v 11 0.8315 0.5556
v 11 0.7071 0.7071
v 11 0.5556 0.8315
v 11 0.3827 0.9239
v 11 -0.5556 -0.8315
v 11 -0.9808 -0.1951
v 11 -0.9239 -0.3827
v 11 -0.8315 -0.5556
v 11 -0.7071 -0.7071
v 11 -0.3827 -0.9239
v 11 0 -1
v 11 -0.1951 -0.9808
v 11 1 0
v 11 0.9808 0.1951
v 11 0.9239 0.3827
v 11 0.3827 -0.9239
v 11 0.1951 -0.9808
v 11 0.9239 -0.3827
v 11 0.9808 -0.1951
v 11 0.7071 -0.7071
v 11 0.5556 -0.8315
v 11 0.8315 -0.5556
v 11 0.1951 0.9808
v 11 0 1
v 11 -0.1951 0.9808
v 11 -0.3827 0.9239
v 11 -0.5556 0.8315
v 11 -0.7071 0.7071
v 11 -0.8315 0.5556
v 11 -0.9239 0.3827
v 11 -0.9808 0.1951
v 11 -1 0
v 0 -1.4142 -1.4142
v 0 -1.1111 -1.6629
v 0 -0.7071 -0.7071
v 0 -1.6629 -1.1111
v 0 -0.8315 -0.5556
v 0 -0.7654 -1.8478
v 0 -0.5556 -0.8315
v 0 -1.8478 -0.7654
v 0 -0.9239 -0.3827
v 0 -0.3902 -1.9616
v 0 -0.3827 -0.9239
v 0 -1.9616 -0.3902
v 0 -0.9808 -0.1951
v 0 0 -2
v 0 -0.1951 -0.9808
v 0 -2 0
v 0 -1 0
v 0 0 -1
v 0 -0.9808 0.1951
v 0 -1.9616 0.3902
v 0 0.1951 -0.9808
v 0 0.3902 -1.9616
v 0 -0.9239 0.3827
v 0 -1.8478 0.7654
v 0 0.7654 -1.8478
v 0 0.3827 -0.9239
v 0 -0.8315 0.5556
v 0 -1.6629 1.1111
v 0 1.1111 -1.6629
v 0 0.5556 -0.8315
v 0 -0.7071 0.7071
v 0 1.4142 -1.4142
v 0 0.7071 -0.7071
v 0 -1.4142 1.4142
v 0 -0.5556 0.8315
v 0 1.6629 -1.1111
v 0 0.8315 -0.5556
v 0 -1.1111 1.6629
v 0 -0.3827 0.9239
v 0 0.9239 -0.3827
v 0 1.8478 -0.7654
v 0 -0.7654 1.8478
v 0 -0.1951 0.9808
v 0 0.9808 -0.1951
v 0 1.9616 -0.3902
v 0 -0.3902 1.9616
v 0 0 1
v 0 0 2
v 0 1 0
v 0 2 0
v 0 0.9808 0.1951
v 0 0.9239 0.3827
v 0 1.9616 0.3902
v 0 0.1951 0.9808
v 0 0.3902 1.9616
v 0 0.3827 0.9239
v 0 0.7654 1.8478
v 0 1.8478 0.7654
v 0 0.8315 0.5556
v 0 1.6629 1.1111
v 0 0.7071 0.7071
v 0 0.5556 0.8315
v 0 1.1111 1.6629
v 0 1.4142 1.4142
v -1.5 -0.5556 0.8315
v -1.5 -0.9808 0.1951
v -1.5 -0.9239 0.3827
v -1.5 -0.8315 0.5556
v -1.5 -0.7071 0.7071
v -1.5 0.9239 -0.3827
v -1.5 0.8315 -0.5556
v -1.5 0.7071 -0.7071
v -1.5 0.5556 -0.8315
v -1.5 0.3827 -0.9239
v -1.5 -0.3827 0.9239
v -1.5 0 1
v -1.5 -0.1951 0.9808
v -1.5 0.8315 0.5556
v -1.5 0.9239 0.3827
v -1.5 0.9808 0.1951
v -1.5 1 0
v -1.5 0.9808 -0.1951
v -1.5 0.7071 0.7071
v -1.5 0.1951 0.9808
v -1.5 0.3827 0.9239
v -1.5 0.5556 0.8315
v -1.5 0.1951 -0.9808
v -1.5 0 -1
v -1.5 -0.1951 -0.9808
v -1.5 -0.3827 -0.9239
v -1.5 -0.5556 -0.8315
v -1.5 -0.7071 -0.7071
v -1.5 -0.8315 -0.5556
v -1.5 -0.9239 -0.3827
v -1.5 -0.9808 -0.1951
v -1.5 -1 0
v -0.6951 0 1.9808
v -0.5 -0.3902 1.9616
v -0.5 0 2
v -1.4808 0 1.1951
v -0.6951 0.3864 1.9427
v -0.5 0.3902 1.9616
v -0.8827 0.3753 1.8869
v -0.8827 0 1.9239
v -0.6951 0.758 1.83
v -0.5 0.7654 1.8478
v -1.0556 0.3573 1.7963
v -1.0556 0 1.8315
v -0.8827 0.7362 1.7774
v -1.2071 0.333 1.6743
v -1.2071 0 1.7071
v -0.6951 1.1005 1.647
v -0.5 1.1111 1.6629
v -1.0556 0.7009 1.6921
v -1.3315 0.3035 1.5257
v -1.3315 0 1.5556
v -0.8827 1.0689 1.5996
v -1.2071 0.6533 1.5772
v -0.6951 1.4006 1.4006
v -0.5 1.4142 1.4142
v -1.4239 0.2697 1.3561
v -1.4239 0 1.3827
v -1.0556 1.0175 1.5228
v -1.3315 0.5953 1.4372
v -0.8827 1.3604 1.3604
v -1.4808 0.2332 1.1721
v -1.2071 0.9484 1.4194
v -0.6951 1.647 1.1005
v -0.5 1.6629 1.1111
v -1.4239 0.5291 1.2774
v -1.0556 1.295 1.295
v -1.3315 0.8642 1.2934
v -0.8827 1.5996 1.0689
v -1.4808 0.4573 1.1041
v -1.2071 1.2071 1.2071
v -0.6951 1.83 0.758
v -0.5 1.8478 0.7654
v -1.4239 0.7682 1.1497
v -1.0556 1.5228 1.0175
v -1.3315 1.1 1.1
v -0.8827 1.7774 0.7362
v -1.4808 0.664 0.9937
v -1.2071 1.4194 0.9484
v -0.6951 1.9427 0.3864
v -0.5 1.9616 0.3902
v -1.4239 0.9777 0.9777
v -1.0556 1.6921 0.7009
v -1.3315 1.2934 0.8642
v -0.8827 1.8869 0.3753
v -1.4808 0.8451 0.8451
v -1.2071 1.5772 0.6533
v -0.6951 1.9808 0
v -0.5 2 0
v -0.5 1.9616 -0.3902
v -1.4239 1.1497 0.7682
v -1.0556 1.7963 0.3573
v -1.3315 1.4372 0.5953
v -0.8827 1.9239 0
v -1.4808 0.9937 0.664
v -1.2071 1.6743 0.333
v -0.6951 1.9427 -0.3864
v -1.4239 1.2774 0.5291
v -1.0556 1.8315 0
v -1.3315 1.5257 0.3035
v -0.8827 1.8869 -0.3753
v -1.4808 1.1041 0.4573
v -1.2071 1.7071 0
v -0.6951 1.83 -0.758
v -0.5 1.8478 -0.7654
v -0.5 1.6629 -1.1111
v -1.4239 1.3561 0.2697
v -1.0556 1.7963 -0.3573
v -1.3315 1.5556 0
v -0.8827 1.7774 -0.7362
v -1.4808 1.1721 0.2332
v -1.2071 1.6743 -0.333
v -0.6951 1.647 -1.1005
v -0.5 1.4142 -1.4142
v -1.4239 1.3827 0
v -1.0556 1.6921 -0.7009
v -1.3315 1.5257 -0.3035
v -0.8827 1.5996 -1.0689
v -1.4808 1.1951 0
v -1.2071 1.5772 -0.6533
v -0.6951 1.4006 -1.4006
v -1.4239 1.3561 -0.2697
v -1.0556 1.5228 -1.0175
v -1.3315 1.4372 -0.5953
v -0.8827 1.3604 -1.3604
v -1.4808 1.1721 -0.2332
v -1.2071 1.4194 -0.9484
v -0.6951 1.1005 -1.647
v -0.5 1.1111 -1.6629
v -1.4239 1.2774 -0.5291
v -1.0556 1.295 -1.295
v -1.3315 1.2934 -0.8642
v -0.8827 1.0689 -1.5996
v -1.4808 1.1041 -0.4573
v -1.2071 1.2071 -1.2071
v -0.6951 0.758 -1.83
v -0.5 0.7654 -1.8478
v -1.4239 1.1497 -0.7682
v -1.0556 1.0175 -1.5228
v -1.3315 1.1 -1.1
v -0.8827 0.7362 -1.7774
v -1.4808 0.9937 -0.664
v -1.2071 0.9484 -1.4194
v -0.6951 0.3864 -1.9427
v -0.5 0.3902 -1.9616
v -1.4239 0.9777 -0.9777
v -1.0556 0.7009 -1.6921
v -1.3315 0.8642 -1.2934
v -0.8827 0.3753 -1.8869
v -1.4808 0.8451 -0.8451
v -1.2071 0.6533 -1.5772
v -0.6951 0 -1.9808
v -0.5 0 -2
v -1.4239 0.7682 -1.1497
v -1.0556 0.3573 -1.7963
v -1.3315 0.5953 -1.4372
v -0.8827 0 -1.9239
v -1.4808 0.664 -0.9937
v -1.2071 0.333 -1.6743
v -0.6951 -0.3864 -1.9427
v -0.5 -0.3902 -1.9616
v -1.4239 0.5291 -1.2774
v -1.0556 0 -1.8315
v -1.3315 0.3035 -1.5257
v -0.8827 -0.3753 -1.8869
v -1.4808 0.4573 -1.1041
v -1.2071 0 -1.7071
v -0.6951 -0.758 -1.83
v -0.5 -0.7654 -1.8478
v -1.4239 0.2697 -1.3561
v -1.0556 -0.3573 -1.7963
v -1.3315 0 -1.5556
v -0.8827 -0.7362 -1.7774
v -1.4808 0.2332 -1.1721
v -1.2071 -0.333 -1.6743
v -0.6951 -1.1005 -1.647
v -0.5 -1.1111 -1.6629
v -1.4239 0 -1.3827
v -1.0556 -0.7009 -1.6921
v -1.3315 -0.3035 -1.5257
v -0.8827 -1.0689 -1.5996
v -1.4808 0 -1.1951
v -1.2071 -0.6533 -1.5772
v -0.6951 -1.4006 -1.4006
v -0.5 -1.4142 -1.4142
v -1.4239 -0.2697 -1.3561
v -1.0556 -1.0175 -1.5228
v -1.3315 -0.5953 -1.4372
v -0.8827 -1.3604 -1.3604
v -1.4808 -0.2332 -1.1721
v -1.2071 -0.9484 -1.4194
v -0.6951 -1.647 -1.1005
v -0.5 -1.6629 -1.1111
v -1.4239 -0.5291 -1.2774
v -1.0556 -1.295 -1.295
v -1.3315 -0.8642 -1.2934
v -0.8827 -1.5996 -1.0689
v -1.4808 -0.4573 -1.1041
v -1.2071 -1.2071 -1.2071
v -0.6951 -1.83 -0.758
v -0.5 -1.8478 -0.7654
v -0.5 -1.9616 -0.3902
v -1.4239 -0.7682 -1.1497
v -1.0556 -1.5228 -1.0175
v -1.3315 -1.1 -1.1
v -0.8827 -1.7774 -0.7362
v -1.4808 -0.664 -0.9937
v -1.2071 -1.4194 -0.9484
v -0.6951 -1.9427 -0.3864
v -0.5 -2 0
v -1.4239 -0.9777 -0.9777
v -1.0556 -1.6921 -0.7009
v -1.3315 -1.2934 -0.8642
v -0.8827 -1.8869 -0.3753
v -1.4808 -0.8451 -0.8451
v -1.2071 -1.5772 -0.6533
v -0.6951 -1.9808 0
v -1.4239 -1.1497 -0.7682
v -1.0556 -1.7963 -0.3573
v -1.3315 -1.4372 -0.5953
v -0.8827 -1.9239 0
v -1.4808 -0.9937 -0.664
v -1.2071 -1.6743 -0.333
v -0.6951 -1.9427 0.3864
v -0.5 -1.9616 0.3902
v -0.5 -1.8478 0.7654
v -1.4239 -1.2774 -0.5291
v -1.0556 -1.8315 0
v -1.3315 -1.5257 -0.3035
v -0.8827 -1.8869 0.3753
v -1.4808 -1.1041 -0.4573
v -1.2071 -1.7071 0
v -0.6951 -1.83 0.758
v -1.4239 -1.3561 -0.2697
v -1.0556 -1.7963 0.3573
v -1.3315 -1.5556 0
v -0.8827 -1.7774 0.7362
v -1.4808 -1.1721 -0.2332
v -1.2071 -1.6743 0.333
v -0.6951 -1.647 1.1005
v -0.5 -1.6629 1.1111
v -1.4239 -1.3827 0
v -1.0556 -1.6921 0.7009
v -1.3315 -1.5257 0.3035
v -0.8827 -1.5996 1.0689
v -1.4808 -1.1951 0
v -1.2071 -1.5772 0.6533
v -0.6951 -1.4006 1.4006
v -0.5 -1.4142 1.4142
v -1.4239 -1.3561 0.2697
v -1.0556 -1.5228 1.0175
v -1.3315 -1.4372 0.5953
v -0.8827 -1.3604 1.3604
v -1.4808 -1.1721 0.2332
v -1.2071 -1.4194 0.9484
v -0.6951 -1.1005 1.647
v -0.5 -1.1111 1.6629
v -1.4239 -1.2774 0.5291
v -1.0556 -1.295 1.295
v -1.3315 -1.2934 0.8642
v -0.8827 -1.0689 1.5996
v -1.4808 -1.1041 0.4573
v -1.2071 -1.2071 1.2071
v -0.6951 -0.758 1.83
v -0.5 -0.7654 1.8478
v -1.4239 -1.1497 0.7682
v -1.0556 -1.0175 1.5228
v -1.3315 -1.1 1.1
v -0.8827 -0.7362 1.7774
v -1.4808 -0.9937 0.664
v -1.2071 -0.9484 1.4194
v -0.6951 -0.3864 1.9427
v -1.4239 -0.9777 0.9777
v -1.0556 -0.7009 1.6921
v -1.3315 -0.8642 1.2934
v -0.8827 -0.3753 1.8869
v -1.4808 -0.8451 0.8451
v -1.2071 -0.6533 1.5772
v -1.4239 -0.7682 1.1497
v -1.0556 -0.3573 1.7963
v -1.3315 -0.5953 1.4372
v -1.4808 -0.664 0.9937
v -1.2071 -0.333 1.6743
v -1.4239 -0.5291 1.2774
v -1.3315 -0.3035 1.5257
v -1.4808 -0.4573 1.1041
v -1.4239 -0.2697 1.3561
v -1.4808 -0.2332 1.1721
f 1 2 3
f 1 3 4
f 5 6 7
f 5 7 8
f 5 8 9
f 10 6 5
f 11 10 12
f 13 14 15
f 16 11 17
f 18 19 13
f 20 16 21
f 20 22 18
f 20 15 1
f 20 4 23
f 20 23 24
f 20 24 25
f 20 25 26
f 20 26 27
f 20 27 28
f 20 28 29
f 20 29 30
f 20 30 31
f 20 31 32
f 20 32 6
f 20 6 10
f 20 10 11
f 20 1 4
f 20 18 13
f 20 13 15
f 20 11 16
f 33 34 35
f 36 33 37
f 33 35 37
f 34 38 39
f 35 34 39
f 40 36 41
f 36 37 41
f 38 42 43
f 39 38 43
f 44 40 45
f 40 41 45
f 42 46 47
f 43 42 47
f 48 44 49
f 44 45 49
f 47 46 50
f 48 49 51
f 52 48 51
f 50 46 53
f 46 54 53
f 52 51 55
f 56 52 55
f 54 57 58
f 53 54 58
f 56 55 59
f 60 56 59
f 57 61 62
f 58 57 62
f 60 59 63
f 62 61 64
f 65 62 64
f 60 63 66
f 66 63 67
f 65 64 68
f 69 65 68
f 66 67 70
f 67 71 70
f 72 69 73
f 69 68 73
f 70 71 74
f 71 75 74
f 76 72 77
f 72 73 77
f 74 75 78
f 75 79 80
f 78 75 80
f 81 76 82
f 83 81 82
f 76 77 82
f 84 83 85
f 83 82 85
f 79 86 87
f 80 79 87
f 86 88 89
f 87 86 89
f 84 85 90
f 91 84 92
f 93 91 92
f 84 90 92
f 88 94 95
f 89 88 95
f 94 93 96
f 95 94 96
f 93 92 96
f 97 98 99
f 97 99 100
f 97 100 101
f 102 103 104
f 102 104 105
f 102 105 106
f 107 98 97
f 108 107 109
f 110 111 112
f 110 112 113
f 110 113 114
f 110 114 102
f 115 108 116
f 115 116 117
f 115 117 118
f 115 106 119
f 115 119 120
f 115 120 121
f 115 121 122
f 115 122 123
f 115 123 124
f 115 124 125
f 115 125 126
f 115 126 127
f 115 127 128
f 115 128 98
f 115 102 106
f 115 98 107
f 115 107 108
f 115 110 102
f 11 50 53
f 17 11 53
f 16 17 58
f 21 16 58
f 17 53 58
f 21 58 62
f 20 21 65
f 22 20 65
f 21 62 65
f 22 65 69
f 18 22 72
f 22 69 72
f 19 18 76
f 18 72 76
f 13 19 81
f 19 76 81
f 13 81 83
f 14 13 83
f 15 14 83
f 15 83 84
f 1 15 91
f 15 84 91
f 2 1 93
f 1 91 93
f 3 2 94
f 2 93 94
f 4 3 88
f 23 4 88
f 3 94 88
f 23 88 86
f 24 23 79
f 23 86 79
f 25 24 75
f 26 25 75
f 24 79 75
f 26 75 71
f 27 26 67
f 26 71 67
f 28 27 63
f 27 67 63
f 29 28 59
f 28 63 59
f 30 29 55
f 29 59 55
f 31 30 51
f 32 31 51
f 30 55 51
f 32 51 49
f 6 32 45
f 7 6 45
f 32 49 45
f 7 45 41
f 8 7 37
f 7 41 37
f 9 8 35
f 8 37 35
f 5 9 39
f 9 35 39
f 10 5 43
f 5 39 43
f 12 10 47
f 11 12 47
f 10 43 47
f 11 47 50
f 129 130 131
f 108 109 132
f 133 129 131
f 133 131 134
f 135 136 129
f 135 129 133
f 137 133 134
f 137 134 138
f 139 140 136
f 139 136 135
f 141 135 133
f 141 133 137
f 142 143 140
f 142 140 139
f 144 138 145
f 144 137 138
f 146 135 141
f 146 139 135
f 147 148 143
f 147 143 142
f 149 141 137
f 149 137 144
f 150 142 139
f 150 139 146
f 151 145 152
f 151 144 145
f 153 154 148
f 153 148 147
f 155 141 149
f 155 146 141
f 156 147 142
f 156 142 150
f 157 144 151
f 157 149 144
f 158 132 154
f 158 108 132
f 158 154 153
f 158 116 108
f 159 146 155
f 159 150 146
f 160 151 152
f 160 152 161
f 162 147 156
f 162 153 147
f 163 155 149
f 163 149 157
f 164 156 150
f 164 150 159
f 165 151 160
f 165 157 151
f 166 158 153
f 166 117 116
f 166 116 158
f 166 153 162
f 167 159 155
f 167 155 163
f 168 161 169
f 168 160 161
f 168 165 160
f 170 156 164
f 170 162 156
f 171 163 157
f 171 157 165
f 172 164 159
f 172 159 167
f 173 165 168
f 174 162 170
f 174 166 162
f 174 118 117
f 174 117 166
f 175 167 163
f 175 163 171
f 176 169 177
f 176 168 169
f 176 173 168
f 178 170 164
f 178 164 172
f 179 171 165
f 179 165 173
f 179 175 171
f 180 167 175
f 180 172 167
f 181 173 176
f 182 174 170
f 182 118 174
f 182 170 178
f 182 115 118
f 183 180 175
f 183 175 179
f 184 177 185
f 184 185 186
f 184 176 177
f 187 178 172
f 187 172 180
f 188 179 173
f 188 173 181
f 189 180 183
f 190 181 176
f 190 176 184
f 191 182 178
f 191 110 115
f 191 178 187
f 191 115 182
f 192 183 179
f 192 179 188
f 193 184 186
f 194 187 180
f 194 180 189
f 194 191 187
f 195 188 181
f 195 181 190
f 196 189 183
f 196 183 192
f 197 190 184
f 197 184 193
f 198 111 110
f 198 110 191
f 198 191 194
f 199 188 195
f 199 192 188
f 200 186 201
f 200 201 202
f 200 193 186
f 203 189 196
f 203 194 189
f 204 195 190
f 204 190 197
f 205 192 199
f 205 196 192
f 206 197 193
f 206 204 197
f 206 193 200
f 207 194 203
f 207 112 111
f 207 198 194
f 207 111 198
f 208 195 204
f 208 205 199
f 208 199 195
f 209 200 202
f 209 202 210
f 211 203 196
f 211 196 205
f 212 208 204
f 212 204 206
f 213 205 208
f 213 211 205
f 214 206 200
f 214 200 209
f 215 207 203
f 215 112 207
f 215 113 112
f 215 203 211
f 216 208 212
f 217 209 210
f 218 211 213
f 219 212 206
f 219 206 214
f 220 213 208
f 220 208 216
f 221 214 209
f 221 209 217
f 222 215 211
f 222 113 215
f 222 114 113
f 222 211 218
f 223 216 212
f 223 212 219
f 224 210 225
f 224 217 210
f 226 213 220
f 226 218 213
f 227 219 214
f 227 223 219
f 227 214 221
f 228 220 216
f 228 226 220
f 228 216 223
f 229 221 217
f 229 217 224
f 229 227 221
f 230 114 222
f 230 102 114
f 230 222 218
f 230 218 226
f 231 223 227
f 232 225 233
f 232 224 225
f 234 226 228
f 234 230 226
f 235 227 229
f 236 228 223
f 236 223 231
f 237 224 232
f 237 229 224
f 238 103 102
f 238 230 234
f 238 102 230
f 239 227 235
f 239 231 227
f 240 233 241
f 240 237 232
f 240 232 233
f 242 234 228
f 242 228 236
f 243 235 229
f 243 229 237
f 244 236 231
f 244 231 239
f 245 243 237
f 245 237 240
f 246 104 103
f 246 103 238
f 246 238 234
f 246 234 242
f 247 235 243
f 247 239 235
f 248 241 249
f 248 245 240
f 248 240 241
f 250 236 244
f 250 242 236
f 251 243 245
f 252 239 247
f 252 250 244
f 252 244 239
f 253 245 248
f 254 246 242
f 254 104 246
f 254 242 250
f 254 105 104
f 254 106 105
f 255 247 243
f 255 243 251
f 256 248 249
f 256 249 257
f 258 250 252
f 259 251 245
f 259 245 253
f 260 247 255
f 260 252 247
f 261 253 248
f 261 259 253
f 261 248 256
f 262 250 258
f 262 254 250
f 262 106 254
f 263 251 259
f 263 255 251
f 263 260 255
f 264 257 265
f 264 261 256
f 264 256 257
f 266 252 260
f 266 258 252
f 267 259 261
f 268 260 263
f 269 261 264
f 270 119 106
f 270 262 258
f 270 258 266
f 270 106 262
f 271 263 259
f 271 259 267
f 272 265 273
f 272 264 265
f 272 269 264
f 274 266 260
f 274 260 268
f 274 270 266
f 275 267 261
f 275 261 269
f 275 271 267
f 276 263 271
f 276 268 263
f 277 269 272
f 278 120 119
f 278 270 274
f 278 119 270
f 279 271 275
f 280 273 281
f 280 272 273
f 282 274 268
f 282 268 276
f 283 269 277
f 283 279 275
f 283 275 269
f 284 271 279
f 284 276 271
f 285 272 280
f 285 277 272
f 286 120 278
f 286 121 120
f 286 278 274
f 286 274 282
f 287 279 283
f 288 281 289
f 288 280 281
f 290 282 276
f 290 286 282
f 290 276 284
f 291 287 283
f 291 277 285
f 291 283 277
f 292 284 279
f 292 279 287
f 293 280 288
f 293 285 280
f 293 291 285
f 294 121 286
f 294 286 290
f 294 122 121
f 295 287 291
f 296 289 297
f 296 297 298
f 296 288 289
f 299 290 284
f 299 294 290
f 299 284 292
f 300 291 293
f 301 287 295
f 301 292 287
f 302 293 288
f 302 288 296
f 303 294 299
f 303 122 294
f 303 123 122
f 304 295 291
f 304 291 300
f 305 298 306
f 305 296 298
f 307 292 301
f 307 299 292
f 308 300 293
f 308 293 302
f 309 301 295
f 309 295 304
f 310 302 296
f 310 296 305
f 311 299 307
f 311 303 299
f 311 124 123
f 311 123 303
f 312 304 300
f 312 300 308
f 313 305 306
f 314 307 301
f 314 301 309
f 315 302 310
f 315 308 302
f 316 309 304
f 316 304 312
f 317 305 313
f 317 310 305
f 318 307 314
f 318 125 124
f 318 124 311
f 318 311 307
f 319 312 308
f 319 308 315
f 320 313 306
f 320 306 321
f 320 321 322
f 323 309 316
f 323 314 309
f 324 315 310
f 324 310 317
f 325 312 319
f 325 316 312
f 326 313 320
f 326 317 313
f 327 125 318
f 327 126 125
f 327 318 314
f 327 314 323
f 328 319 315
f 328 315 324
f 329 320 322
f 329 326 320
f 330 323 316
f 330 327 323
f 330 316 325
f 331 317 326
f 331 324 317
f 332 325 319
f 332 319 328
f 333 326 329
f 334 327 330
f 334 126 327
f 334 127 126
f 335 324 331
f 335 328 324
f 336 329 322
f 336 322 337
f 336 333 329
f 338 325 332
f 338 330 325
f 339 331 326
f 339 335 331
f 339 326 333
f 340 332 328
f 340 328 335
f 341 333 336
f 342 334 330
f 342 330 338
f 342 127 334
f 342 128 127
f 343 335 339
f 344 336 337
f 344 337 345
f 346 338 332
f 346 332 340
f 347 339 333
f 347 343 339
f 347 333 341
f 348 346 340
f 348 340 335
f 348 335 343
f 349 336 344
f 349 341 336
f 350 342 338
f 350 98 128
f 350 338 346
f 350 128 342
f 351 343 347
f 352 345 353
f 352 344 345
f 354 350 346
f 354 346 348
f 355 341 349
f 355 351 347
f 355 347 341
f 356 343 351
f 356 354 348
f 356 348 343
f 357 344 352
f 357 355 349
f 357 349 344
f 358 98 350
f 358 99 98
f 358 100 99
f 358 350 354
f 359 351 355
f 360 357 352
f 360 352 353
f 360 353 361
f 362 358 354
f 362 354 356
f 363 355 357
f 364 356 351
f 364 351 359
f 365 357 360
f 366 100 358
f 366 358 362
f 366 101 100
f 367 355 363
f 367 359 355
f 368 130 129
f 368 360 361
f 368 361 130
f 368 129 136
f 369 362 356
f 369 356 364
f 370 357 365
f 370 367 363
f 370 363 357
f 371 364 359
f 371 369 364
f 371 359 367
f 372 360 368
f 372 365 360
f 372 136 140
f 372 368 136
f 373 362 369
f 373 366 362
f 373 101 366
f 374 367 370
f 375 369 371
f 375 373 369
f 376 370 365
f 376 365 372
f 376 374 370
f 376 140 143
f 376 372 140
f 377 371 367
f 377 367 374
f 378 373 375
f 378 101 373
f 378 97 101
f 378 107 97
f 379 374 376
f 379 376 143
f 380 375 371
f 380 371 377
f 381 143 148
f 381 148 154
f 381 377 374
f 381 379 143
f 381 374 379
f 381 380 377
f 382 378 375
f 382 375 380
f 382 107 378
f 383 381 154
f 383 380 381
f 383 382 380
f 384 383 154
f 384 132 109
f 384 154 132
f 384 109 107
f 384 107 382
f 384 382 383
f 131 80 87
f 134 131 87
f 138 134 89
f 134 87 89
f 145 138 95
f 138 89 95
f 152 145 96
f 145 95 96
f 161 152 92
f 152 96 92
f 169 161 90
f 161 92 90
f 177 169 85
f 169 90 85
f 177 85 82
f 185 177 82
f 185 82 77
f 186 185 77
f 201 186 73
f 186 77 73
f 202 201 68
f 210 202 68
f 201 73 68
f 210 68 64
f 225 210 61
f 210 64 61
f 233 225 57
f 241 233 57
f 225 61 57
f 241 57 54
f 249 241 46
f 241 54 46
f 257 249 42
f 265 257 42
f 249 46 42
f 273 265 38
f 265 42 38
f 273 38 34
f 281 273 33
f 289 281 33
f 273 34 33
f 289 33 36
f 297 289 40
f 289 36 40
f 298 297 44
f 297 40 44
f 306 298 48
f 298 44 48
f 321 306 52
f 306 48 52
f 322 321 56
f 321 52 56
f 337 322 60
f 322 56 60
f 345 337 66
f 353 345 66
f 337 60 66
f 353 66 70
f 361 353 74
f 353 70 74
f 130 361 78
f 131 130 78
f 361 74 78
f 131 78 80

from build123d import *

# Parameters (mm, degrees)
SKETCH1_R           = 1
BOSS_EXTRUDE1_DEPTH = 11
SKETCH2_R           = 2
BOSS_EXTRUDE2_DEPTH = 1.5
FILLET1_R           = 1


with BuildPart() as part:
    # Sketch1 → Boss-Extrude1 (new body)
    with BuildSketch(Plane(origin=(0, 0, 0), x_dir=(0, 0, -1), z_dir=(1, 0, 0))):
        Circle(SKETCH1_R)
    extrude(amount=BOSS_EXTRUDE1_DEPTH)

    # Sketch2 → Boss-Extrude2 (add)
    with BuildSketch(Plane.ZY):
        Circle(SKETCH2_R)
    extrude(amount=BOSS_EXTRUDE2_DEPTH)

    # Fillet1
    fillet1_edges = [part.edges().sort_by_distance(p)[0] for p in [
        (-1.5, 0, -2),
    ]]
    fillet(fillet1_edges, radius=FILLET1_R)


solid = part.part
